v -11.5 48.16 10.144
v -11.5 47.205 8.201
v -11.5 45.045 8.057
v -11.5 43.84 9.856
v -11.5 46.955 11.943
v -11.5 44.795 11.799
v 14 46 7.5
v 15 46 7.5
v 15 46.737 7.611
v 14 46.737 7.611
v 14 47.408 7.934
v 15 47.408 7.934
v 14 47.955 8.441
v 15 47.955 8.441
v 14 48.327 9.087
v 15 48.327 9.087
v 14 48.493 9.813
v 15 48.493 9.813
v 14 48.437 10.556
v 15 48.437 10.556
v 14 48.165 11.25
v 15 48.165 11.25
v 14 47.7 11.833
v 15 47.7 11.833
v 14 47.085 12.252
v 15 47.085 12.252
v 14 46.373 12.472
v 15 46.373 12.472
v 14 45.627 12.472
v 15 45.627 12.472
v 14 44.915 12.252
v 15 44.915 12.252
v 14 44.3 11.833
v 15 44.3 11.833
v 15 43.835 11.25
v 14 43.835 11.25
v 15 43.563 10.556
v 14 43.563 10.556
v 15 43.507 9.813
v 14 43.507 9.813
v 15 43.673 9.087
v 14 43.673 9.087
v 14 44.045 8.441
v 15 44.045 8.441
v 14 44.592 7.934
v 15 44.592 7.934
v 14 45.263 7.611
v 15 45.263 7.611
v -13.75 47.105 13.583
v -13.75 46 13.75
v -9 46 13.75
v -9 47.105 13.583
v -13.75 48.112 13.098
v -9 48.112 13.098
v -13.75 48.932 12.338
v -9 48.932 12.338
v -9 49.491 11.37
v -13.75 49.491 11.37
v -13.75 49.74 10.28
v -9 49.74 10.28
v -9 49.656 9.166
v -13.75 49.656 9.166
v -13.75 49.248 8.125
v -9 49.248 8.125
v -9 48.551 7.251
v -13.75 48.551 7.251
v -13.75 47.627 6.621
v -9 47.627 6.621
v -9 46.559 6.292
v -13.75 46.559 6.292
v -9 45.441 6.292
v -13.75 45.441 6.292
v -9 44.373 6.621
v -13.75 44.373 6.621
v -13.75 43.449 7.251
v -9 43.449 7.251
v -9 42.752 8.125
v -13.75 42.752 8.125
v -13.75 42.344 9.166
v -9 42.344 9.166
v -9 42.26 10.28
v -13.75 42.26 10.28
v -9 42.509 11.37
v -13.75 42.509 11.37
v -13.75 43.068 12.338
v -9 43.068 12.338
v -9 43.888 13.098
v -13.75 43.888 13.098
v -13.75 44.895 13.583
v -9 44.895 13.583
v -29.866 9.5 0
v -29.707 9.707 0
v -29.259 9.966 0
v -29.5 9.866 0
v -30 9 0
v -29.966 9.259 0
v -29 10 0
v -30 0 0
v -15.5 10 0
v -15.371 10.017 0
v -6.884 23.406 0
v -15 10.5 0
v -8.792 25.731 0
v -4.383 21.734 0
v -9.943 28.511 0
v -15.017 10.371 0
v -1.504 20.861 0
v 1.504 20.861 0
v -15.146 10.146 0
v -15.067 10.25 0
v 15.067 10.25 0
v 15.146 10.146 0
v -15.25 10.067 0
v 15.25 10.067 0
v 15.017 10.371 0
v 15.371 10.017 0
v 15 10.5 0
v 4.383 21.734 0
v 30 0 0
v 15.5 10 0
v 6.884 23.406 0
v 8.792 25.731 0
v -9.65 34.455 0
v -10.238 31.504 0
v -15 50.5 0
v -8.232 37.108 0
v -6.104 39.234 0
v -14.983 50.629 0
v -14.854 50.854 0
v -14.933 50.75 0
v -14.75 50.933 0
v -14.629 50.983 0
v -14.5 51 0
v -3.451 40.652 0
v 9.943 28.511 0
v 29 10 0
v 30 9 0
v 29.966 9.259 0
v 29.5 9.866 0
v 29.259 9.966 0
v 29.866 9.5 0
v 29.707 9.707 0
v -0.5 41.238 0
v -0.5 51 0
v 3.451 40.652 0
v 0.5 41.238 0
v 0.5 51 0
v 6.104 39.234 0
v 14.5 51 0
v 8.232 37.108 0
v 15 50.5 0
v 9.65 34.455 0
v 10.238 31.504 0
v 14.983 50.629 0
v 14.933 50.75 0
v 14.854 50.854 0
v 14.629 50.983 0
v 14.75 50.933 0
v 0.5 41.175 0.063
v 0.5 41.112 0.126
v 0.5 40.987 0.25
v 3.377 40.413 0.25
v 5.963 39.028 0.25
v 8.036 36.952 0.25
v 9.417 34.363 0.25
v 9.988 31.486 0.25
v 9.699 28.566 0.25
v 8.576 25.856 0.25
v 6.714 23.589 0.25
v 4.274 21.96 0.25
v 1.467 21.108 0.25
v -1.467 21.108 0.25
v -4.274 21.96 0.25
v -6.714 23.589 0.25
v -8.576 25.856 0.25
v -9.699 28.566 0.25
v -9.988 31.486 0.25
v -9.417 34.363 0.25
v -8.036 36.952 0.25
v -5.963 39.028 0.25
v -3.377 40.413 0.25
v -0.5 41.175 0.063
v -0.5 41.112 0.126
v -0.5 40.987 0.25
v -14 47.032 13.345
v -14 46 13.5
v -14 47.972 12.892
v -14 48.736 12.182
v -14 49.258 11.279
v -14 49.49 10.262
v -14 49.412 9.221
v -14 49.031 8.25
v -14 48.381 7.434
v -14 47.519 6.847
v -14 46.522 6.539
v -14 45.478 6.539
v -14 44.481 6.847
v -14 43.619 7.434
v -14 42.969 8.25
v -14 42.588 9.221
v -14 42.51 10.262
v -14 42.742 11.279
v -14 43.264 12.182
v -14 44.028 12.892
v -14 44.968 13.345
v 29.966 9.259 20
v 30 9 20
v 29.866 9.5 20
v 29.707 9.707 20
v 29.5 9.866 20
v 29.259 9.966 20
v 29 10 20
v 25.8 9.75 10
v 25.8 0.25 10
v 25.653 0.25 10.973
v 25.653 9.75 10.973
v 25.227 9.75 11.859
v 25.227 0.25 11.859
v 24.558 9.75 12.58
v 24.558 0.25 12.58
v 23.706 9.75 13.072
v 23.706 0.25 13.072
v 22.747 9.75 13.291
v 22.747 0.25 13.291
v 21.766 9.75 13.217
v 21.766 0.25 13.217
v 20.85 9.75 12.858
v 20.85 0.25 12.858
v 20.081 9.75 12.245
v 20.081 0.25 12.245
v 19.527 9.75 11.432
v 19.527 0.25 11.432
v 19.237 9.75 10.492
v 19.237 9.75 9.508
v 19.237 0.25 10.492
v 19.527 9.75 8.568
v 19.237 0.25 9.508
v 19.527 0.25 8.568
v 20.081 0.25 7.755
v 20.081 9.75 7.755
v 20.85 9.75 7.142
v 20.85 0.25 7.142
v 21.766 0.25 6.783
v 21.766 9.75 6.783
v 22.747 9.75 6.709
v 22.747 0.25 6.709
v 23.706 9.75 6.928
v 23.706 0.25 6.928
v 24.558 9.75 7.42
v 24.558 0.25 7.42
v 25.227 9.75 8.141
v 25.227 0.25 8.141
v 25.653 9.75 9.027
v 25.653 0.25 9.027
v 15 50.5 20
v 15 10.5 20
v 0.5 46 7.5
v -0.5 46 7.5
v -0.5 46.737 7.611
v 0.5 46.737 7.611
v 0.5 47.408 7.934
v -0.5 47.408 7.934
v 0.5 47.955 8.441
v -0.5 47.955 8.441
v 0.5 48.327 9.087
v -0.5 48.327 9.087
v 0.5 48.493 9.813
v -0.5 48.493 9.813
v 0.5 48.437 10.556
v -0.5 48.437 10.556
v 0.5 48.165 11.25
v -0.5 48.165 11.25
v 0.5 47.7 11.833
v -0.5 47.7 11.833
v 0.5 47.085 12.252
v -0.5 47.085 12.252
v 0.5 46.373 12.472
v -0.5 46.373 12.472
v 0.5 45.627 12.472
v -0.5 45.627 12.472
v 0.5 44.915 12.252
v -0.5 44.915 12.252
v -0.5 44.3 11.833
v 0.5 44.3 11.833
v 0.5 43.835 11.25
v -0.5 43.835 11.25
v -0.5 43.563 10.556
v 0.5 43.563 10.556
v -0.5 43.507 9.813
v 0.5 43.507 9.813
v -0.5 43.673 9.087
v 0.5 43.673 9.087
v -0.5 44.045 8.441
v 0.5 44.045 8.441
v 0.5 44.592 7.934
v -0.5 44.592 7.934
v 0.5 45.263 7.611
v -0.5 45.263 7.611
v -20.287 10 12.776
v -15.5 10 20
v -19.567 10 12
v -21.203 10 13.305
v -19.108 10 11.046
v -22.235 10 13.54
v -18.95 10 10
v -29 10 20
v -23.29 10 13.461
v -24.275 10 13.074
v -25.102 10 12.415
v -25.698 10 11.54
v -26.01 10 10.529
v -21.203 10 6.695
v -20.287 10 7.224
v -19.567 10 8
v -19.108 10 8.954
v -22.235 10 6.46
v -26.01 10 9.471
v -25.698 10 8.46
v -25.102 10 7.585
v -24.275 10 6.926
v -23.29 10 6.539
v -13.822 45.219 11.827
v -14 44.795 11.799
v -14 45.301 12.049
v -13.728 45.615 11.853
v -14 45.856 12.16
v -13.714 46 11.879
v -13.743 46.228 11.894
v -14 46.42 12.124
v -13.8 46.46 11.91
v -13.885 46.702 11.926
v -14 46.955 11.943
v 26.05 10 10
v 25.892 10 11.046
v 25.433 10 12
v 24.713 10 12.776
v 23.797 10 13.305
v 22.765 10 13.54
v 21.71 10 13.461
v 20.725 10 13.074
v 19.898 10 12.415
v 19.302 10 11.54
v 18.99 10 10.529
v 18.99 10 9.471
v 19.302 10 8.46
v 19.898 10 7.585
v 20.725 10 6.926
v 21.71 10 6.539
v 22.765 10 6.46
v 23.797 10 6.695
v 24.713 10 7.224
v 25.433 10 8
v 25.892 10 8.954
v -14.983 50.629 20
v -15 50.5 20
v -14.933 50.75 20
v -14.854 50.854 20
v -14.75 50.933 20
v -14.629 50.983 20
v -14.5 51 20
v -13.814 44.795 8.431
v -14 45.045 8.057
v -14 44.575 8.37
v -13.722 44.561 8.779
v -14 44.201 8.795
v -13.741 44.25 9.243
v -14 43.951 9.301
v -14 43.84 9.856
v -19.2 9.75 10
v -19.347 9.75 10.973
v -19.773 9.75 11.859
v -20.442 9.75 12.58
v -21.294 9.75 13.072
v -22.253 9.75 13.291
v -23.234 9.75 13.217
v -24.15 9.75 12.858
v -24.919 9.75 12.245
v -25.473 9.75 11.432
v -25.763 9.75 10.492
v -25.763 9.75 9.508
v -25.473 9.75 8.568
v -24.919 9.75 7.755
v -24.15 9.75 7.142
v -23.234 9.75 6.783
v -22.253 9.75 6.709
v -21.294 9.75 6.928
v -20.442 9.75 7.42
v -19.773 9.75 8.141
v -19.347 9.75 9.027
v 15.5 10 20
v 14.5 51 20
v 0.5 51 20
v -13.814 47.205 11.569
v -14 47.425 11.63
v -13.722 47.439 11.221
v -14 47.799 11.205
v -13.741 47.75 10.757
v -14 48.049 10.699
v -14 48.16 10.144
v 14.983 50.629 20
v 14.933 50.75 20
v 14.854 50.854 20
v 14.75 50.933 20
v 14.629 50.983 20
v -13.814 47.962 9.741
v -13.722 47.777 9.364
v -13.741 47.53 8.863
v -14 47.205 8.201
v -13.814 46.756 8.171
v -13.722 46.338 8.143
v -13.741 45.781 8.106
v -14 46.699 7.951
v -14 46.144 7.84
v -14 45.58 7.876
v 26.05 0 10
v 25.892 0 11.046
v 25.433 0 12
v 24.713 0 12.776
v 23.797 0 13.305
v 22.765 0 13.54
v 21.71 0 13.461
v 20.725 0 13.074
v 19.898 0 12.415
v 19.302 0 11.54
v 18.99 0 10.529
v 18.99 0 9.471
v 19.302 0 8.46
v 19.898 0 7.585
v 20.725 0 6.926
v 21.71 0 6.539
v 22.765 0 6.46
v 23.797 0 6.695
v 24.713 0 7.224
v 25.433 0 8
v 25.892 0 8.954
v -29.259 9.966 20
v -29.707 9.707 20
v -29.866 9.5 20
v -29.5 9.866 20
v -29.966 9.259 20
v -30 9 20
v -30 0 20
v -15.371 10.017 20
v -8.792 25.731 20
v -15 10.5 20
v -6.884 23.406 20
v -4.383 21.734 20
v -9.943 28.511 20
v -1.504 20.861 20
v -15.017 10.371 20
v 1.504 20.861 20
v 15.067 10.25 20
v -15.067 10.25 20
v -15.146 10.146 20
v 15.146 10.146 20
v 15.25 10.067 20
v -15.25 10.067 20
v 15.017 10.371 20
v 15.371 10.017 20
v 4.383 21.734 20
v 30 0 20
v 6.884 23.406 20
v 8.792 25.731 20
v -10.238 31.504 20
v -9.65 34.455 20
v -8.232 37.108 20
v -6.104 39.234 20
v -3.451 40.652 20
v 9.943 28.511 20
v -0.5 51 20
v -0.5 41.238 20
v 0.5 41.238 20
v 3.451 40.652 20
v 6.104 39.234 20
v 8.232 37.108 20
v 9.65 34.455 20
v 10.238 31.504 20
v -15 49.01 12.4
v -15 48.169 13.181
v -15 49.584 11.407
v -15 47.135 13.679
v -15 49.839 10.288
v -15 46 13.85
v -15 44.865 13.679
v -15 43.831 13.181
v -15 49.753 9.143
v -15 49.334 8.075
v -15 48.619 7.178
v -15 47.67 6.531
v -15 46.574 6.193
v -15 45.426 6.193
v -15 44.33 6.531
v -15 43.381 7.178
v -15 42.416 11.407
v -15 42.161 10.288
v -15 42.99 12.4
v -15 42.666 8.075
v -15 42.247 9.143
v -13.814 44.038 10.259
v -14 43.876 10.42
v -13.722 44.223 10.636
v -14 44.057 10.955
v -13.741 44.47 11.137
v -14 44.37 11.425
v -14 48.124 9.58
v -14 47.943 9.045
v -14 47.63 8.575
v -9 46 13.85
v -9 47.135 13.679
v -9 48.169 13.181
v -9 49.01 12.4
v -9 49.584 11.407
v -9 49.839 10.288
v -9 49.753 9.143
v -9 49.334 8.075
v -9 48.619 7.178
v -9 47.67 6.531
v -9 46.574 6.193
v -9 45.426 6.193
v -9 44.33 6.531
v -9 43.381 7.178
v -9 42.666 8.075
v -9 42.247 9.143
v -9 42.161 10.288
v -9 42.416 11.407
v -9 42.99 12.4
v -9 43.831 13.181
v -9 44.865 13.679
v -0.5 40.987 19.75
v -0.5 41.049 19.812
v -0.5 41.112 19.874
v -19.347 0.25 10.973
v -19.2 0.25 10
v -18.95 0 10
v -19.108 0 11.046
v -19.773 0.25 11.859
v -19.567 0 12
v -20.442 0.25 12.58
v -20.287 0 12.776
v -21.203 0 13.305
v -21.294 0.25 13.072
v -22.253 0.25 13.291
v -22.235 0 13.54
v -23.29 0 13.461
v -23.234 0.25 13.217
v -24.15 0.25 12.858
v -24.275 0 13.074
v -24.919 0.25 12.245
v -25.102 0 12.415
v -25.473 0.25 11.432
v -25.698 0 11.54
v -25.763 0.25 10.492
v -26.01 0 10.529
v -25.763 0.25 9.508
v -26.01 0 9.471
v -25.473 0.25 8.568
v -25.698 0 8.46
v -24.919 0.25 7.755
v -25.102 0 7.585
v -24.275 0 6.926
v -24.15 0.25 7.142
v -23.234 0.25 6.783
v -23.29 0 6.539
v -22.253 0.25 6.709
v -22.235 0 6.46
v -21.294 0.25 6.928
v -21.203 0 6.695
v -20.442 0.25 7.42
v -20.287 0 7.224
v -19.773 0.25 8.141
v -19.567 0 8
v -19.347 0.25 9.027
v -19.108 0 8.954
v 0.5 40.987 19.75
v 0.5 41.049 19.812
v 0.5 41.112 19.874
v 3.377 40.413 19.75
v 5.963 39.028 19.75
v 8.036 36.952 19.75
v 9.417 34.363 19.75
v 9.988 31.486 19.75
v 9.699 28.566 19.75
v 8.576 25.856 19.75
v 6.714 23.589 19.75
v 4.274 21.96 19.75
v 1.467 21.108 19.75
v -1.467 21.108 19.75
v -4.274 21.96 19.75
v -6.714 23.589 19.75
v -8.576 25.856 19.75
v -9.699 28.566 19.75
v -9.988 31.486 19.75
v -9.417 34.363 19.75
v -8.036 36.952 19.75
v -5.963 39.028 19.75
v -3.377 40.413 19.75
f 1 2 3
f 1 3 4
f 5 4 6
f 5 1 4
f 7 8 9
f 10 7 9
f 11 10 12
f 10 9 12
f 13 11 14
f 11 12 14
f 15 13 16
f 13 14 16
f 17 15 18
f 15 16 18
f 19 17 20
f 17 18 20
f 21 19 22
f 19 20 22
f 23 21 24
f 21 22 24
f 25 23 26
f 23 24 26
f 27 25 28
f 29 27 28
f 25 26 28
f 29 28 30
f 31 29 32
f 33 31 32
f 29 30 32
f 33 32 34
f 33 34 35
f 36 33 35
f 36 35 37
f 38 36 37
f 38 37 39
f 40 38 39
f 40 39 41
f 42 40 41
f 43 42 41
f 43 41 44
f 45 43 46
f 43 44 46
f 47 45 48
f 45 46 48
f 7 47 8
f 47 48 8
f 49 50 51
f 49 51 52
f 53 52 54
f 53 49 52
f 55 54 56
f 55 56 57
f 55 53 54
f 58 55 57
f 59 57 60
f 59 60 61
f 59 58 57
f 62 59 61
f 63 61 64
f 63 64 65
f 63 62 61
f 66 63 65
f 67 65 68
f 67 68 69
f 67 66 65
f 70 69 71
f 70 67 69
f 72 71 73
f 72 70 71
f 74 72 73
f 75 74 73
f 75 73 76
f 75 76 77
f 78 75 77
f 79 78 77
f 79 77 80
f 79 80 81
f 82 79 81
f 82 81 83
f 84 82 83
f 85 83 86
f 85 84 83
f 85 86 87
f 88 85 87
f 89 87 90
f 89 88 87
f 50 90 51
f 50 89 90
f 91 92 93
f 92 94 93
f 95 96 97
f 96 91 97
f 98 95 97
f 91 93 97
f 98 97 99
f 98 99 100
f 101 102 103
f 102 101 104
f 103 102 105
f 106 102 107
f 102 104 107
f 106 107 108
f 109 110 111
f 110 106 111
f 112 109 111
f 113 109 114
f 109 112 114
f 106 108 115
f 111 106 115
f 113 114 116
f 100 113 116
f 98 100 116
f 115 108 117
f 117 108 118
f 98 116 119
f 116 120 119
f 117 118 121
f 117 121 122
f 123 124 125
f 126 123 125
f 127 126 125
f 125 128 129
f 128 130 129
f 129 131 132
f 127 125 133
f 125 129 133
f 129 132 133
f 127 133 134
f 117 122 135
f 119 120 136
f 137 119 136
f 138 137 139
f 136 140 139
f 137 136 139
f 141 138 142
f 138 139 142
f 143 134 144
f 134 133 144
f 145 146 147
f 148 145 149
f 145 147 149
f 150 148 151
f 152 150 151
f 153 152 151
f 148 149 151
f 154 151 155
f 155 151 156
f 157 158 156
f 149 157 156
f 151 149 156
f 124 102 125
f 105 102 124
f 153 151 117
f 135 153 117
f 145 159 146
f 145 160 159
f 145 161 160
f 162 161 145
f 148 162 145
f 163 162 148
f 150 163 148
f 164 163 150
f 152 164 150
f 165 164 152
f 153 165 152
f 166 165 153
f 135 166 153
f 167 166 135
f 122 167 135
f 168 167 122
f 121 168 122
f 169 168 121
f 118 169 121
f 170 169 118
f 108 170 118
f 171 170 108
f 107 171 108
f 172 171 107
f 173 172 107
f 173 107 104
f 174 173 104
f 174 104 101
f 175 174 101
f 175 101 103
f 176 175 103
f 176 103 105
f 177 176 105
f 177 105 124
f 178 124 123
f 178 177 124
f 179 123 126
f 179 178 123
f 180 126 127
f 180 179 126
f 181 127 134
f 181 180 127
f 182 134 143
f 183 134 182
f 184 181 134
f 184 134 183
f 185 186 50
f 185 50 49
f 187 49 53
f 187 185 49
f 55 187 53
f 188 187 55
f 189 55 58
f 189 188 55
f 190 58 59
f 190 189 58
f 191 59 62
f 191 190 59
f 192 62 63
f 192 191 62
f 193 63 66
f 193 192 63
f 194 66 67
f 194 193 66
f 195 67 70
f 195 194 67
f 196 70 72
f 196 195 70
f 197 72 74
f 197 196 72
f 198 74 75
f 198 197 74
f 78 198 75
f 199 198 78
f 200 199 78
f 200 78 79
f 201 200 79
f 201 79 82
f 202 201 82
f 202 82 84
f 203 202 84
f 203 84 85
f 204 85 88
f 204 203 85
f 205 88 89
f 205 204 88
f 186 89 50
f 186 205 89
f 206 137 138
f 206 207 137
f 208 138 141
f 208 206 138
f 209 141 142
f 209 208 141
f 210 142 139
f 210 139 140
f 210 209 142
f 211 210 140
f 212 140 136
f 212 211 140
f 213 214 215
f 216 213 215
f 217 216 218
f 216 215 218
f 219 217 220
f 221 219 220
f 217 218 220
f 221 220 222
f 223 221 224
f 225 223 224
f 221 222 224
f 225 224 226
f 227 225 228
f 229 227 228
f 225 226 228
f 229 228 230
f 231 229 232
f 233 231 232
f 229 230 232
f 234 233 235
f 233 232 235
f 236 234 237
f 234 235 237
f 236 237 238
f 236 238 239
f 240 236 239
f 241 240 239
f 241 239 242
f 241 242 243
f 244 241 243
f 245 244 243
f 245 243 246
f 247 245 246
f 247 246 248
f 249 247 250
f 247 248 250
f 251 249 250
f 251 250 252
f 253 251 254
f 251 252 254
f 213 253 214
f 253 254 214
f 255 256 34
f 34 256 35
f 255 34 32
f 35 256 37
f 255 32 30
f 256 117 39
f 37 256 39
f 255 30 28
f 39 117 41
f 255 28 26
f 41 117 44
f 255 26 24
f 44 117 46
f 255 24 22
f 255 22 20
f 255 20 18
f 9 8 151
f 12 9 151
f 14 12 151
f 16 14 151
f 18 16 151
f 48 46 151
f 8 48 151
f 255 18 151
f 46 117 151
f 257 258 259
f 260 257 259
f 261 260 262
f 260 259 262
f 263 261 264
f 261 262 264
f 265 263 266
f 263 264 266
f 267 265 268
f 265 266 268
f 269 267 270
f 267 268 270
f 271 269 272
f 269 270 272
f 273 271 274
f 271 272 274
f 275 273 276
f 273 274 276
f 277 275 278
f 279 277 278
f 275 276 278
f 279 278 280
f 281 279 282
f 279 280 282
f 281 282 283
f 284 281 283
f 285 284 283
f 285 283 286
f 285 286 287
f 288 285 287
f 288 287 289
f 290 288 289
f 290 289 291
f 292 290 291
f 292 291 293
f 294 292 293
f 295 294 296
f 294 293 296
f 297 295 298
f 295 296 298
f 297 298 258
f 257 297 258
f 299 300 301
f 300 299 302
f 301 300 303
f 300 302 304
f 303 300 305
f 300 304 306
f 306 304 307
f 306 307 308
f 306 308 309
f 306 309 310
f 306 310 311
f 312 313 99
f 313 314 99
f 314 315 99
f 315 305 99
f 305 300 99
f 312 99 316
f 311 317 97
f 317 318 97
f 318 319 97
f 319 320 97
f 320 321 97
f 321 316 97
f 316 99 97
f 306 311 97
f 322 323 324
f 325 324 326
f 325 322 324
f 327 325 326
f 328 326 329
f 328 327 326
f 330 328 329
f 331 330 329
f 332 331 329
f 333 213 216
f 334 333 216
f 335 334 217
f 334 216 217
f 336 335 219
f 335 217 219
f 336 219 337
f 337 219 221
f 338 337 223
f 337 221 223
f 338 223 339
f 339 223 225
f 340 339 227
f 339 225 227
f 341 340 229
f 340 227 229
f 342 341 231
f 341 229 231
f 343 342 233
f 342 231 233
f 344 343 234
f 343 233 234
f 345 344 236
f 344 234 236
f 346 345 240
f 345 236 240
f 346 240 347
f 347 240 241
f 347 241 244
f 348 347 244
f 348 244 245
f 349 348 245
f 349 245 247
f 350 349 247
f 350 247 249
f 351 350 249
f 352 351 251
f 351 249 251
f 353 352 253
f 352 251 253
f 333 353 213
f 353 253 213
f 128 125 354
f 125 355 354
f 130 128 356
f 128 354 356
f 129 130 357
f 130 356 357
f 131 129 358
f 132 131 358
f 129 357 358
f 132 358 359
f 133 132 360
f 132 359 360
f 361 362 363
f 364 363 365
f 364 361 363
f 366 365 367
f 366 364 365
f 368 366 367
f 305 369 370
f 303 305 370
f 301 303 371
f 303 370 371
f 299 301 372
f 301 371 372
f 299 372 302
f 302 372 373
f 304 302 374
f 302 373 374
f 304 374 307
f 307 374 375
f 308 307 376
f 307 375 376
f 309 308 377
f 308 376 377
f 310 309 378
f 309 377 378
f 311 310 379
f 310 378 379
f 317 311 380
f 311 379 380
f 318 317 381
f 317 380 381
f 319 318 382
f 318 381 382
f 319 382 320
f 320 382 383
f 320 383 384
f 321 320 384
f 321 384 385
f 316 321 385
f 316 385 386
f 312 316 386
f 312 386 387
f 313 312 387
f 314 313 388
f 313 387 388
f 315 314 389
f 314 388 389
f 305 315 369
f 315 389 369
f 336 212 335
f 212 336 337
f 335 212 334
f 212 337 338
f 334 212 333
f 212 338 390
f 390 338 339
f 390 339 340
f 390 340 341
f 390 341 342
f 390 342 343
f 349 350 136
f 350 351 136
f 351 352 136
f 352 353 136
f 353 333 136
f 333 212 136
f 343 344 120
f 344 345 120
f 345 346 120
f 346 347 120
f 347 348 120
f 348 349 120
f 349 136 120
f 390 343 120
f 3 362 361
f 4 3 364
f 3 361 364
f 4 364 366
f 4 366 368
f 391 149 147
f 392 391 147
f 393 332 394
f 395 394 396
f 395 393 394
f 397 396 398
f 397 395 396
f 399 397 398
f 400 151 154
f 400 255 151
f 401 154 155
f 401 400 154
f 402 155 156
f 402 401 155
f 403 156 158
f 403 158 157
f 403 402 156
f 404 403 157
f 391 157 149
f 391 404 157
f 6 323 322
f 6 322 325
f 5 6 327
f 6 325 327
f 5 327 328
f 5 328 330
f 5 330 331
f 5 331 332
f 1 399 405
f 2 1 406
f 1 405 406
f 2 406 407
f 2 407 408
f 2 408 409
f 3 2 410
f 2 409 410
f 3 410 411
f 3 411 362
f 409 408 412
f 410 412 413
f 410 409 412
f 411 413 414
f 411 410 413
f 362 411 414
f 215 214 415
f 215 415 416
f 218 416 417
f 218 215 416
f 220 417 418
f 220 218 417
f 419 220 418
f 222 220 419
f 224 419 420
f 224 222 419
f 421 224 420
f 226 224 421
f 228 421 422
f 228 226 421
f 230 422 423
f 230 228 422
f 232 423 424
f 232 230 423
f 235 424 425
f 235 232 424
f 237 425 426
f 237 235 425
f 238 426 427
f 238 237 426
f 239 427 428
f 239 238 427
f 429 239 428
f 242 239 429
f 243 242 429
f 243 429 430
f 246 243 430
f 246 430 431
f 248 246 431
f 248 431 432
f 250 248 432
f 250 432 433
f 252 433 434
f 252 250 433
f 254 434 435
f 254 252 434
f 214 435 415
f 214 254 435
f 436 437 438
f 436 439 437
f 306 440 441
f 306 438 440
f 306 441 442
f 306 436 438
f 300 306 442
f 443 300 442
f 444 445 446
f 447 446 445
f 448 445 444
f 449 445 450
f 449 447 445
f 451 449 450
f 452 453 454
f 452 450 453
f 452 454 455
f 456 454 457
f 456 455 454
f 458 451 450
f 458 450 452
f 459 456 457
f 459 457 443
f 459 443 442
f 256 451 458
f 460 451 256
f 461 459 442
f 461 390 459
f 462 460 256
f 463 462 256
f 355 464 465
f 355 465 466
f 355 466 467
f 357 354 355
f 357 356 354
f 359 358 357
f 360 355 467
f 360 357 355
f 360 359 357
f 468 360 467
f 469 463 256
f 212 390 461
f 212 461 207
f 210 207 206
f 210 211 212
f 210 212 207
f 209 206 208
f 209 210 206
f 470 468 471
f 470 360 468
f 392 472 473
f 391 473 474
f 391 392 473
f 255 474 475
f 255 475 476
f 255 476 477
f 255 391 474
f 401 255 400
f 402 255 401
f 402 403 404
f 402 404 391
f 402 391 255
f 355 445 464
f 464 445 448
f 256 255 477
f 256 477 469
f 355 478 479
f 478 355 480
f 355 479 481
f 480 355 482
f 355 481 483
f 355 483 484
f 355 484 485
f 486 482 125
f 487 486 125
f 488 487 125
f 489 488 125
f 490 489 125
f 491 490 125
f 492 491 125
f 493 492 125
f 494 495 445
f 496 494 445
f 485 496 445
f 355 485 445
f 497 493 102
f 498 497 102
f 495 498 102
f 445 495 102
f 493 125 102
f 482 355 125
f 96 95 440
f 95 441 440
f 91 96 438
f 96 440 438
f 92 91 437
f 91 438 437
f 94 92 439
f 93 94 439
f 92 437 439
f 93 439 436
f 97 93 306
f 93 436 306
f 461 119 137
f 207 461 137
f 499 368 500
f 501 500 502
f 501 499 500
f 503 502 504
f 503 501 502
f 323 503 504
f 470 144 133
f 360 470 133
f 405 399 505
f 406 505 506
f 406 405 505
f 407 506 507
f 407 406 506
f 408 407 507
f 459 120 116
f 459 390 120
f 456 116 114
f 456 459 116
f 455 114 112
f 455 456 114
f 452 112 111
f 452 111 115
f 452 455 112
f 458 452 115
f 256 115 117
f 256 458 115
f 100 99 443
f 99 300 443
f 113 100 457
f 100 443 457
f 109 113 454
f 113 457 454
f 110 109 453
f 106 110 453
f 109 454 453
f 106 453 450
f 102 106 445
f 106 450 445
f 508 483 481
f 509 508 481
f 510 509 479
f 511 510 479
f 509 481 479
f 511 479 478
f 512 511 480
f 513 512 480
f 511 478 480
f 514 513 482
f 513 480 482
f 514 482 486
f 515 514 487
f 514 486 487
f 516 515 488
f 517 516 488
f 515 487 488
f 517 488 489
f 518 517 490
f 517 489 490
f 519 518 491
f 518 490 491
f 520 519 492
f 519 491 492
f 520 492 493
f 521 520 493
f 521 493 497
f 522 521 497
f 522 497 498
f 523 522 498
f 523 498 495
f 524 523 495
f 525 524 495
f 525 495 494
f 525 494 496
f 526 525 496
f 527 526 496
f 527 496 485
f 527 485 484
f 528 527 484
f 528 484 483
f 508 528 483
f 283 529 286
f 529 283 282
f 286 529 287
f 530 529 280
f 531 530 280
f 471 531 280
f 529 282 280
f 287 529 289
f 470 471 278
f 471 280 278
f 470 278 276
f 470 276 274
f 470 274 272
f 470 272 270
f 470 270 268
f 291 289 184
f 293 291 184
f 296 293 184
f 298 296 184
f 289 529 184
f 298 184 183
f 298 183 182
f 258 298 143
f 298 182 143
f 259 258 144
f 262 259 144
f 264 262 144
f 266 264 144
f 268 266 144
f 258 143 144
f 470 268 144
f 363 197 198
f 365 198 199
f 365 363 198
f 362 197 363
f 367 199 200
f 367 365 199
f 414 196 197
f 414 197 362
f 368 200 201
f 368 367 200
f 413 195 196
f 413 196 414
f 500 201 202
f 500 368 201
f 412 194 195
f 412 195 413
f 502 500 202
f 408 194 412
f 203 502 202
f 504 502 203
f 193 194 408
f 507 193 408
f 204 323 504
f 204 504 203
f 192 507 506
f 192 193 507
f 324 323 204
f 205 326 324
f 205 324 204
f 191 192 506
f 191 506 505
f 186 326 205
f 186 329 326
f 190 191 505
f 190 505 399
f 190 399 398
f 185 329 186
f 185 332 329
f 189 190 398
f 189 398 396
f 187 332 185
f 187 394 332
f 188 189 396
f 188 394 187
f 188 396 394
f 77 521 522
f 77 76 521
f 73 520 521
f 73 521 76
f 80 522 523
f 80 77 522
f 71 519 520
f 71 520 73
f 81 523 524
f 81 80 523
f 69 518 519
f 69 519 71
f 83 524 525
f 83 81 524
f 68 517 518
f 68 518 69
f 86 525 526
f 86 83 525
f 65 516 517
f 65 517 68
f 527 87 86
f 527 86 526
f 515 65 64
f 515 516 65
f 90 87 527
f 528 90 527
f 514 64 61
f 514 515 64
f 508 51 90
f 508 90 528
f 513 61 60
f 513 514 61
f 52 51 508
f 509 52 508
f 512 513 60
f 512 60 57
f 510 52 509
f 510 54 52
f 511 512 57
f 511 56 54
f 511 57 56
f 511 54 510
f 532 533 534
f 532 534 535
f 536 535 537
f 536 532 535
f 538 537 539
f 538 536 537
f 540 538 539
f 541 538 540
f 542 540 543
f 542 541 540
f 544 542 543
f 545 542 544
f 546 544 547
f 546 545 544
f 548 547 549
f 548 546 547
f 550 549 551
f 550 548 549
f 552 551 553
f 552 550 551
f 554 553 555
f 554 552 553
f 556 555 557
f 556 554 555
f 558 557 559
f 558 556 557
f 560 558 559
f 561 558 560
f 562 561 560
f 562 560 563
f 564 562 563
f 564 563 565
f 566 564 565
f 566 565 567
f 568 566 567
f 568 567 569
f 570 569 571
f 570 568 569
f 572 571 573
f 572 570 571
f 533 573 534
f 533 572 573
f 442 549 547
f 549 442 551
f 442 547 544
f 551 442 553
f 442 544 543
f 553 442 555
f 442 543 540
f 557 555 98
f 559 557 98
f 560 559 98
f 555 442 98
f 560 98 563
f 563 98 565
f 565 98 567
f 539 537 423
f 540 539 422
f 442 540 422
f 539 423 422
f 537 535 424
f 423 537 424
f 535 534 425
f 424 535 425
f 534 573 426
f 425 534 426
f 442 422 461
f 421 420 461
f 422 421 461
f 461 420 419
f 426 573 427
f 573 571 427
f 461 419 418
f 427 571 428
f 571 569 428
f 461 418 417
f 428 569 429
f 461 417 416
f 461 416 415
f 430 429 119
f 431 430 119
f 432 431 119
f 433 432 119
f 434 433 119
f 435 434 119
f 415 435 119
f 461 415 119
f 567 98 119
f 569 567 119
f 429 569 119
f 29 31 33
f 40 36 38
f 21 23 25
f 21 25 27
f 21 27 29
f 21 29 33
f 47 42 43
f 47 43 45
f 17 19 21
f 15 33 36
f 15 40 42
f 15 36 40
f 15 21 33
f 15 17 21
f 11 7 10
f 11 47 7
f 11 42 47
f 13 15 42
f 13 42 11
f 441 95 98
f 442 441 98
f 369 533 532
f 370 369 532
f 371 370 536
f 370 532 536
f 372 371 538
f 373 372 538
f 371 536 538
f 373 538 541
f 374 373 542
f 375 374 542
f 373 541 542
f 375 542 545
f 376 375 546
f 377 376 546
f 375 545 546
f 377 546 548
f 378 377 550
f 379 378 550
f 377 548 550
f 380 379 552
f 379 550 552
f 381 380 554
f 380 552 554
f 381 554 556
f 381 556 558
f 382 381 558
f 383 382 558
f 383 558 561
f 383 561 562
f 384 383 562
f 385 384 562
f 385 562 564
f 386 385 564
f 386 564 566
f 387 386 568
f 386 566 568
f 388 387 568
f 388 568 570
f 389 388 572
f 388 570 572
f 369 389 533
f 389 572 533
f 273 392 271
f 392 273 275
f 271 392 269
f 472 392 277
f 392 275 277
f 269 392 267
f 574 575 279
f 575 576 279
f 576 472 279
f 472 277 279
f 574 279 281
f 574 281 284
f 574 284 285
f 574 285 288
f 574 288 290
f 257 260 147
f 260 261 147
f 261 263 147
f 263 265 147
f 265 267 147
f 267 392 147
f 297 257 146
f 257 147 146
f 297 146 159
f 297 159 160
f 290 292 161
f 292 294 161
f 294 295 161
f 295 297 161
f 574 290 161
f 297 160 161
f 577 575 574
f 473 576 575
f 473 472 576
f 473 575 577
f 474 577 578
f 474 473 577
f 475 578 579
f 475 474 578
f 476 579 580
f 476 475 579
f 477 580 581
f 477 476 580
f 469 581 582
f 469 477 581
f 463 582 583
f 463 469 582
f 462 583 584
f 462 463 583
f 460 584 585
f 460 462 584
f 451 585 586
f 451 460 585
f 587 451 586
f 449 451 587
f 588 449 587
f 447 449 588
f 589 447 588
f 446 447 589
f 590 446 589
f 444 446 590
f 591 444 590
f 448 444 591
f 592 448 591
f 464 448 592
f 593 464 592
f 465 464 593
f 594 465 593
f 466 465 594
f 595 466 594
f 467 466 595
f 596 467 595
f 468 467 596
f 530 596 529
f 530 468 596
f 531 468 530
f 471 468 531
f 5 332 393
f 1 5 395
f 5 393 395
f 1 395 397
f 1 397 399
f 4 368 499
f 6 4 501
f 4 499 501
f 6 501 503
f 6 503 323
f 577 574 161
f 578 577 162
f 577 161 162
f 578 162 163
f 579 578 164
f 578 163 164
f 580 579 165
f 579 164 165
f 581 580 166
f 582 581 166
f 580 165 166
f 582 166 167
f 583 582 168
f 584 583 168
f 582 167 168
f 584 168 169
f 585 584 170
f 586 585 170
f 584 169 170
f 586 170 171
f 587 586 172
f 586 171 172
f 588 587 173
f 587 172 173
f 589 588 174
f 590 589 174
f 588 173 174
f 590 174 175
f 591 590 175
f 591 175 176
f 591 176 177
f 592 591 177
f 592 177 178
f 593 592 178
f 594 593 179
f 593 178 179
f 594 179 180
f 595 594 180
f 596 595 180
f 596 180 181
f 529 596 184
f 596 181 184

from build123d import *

# Parameters (mm, degrees)
BOSS_EXTRUDE1_DEPTH     = 20
SKETCH3_R               = 3.3
CUT_EXTRUDE1_DEPTH      = 1
CUT_EXTRUDE1_DEPTH_BACK = 10
FILLET1_R               = 1
FILLET2_R               = 0.5
CHAMFER1_SIZE           = 0.25
SKETCH4_R               = 3.85
CUT_EXTRUDE2_DEPTH      = 1
SKETCH5_R               = 3.85
SKETCH5_R_2             = 3.75
CUT_EXTRUDE3_DEPTH      = 5
CHAMFER2_SIZE           = 0.25
CUT_EXTRUDE4_DEPTH      = 2.5
SKETCH7_R               = 2.5
BOSS_EXTRUDE2_DEPTH     = 1
SKETCH8_R               = 2.5
CUT_EXTRUDE5_DEPTH      = 1
SKETCH9_R               = 2.165063509
CUT_EXTRUDE6_DEPTH      = 1
CUT_EXTRUDE6_TAPER      = 45


with BuildPart() as part:
    # Sketch1 → Boss-Extrude1 (new body)
    with BuildSketch(Plane.XY):
        with BuildLine():
            Line((-30, 0), (30, 0))
            Line((30, 0), (30, 10))
            Line((30, 10), (15, 10))
            Line((15, 10), (15, 51))
            Line((15, 51), (0.5, 51))
            Line((0.5, 51), (0.5, 40.987492178))
            ThreePointArc((0.5, 40.987492178), (0, 21), (-0.5, 40.987492178))
            Line((-0.5, 40.987492178), (-0.5, 51))
            Line((-0.5, 51), (-15, 51))
            Line((-15, 51), (-15, 10))
            Line((-15, 10), (-30, 10))
            Line((-30, 10), (-30, 0))
        make_face()
    extrude(amount=BOSS_EXTRUDE1_DEPTH)

    # Sketch3 → Cut-Extrude1 (cut, two sides)
    with BuildSketch(Plane.XZ) as cut_extrude1_sk:
        with Locations((-22.5, 10)):
            Circle(SKETCH3_R)
        with Locations((22.5, 10)):
            Circle(SKETCH3_R)
    extrude(amount=CUT_EXTRUDE1_DEPTH, mode=Mode.SUBTRACT)
    extrude(cut_extrude1_sk.sketch, amount=-CUT_EXTRUDE1_DEPTH_BACK, mode=Mode.SUBTRACT)

    # Fillet1
    fillet1_edges = [part.edges().sort_by_distance(p)[0] for p in [
        (-30, 10, 10),
        (30, 10, 10),
    ]]
    fillet(fillet1_edges, radius=FILLET1_R)

    # Fillet2
    fillet2_edges = [part.edges().sort_by_distance(p)[0] for p in [
        (-15, 10, 10),
        (-15, 51, 10),
        (15, 51, 10),
        (15, 10, 10),
    ]]
    fillet(fillet2_edges, radius=FILLET2_R)

    # Chamfer1
    chamfer1_edges = [part.edges().sort_by_distance(p)[0] for p in [
        (0, 21, 0),
        (0, 21, 20),
        (19.2, 10, 10),
        (19.2, 0, 10),
        (-25.8, 10, 10),
        (-25.8, 0, 10),
    ]]
    chamfer(chamfer1_edges, length=CHAMFER1_SIZE)

    # Sketch4 → Cut-Extrude2 (cut)
    with BuildSketch(Plane.ZY.offset(15)):
        with Locations((10, 46)):
            Circle(SKETCH4_R)
    extrude(amount=-CUT_EXTRUDE2_DEPTH, mode=Mode.SUBTRACT)

    # Sketch5 → Cut-Extrude3 (cut)
    with BuildSketch(Plane.ZY.offset(14)):
        with Locations((10, 46)):
            Circle(SKETCH5_R)
        with Locations((10, 46)):
            Circle(SKETCH5_R_2, mode=Mode.SUBTRACT)
    extrude(amount=-CUT_EXTRUDE3_DEPTH, mode=Mode.SUBTRACT)

    # Chamfer2
    chamfer2_edges = [part.edges().sort_by_distance(p)[0] for p in [
        (-14, 46, 6.25),
    ]]
    chamfer(chamfer2_edges, length=CHAMFER2_SIZE)

    # Sketch6 → Cut-Extrude4 (cut)
    with BuildSketch(Plane.ZY.offset(14)):
        Polygon((9.85568838, 43.839751367), (11.798674385, 44.794898154), (11.942986005, 46.955146787), (10.14431162, 48.160248633), (8.201325615, 47.205101846), (8.057013995, 45.044853213), align=None)
    extrude(amount=-CUT_EXTRUDE4_DEPTH, mode=Mode.SUBTRACT)

    # Sketch7 → Boss-Extrude2 (add)
    with BuildSketch(Plane(origin=(-0.5, 0, 0), x_dir=(0, 0, -1), z_dir=(1, 0, 0))):
        with Locations((-10, 46)):
            Circle(SKETCH7_R)
    extrude(amount=BOSS_EXTRUDE2_DEPTH)

    # Sketch8 → Cut-Extrude5 (cut)
    with BuildSketch(Plane(origin=(15, 0, 0), x_dir=(0, 0, -1), z_dir=(1, 0, 0))):
        with Locations((-10, 46)):
            Circle(SKETCH8_R)
    extrude(amount=-CUT_EXTRUDE5_DEPTH, mode=Mode.SUBTRACT)

    # Sketch9 → Cut-Extrude6 (cut)
    with BuildSketch(Plane.ZY.offset(14)):
        with Locations((10, 46)):
            Circle(SKETCH9_R)
    extrude(amount=-CUT_EXTRUDE6_DEPTH, taper=CUT_EXTRUDE6_TAPER, mode=Mode.SUBTRACT)


solid = part.part
